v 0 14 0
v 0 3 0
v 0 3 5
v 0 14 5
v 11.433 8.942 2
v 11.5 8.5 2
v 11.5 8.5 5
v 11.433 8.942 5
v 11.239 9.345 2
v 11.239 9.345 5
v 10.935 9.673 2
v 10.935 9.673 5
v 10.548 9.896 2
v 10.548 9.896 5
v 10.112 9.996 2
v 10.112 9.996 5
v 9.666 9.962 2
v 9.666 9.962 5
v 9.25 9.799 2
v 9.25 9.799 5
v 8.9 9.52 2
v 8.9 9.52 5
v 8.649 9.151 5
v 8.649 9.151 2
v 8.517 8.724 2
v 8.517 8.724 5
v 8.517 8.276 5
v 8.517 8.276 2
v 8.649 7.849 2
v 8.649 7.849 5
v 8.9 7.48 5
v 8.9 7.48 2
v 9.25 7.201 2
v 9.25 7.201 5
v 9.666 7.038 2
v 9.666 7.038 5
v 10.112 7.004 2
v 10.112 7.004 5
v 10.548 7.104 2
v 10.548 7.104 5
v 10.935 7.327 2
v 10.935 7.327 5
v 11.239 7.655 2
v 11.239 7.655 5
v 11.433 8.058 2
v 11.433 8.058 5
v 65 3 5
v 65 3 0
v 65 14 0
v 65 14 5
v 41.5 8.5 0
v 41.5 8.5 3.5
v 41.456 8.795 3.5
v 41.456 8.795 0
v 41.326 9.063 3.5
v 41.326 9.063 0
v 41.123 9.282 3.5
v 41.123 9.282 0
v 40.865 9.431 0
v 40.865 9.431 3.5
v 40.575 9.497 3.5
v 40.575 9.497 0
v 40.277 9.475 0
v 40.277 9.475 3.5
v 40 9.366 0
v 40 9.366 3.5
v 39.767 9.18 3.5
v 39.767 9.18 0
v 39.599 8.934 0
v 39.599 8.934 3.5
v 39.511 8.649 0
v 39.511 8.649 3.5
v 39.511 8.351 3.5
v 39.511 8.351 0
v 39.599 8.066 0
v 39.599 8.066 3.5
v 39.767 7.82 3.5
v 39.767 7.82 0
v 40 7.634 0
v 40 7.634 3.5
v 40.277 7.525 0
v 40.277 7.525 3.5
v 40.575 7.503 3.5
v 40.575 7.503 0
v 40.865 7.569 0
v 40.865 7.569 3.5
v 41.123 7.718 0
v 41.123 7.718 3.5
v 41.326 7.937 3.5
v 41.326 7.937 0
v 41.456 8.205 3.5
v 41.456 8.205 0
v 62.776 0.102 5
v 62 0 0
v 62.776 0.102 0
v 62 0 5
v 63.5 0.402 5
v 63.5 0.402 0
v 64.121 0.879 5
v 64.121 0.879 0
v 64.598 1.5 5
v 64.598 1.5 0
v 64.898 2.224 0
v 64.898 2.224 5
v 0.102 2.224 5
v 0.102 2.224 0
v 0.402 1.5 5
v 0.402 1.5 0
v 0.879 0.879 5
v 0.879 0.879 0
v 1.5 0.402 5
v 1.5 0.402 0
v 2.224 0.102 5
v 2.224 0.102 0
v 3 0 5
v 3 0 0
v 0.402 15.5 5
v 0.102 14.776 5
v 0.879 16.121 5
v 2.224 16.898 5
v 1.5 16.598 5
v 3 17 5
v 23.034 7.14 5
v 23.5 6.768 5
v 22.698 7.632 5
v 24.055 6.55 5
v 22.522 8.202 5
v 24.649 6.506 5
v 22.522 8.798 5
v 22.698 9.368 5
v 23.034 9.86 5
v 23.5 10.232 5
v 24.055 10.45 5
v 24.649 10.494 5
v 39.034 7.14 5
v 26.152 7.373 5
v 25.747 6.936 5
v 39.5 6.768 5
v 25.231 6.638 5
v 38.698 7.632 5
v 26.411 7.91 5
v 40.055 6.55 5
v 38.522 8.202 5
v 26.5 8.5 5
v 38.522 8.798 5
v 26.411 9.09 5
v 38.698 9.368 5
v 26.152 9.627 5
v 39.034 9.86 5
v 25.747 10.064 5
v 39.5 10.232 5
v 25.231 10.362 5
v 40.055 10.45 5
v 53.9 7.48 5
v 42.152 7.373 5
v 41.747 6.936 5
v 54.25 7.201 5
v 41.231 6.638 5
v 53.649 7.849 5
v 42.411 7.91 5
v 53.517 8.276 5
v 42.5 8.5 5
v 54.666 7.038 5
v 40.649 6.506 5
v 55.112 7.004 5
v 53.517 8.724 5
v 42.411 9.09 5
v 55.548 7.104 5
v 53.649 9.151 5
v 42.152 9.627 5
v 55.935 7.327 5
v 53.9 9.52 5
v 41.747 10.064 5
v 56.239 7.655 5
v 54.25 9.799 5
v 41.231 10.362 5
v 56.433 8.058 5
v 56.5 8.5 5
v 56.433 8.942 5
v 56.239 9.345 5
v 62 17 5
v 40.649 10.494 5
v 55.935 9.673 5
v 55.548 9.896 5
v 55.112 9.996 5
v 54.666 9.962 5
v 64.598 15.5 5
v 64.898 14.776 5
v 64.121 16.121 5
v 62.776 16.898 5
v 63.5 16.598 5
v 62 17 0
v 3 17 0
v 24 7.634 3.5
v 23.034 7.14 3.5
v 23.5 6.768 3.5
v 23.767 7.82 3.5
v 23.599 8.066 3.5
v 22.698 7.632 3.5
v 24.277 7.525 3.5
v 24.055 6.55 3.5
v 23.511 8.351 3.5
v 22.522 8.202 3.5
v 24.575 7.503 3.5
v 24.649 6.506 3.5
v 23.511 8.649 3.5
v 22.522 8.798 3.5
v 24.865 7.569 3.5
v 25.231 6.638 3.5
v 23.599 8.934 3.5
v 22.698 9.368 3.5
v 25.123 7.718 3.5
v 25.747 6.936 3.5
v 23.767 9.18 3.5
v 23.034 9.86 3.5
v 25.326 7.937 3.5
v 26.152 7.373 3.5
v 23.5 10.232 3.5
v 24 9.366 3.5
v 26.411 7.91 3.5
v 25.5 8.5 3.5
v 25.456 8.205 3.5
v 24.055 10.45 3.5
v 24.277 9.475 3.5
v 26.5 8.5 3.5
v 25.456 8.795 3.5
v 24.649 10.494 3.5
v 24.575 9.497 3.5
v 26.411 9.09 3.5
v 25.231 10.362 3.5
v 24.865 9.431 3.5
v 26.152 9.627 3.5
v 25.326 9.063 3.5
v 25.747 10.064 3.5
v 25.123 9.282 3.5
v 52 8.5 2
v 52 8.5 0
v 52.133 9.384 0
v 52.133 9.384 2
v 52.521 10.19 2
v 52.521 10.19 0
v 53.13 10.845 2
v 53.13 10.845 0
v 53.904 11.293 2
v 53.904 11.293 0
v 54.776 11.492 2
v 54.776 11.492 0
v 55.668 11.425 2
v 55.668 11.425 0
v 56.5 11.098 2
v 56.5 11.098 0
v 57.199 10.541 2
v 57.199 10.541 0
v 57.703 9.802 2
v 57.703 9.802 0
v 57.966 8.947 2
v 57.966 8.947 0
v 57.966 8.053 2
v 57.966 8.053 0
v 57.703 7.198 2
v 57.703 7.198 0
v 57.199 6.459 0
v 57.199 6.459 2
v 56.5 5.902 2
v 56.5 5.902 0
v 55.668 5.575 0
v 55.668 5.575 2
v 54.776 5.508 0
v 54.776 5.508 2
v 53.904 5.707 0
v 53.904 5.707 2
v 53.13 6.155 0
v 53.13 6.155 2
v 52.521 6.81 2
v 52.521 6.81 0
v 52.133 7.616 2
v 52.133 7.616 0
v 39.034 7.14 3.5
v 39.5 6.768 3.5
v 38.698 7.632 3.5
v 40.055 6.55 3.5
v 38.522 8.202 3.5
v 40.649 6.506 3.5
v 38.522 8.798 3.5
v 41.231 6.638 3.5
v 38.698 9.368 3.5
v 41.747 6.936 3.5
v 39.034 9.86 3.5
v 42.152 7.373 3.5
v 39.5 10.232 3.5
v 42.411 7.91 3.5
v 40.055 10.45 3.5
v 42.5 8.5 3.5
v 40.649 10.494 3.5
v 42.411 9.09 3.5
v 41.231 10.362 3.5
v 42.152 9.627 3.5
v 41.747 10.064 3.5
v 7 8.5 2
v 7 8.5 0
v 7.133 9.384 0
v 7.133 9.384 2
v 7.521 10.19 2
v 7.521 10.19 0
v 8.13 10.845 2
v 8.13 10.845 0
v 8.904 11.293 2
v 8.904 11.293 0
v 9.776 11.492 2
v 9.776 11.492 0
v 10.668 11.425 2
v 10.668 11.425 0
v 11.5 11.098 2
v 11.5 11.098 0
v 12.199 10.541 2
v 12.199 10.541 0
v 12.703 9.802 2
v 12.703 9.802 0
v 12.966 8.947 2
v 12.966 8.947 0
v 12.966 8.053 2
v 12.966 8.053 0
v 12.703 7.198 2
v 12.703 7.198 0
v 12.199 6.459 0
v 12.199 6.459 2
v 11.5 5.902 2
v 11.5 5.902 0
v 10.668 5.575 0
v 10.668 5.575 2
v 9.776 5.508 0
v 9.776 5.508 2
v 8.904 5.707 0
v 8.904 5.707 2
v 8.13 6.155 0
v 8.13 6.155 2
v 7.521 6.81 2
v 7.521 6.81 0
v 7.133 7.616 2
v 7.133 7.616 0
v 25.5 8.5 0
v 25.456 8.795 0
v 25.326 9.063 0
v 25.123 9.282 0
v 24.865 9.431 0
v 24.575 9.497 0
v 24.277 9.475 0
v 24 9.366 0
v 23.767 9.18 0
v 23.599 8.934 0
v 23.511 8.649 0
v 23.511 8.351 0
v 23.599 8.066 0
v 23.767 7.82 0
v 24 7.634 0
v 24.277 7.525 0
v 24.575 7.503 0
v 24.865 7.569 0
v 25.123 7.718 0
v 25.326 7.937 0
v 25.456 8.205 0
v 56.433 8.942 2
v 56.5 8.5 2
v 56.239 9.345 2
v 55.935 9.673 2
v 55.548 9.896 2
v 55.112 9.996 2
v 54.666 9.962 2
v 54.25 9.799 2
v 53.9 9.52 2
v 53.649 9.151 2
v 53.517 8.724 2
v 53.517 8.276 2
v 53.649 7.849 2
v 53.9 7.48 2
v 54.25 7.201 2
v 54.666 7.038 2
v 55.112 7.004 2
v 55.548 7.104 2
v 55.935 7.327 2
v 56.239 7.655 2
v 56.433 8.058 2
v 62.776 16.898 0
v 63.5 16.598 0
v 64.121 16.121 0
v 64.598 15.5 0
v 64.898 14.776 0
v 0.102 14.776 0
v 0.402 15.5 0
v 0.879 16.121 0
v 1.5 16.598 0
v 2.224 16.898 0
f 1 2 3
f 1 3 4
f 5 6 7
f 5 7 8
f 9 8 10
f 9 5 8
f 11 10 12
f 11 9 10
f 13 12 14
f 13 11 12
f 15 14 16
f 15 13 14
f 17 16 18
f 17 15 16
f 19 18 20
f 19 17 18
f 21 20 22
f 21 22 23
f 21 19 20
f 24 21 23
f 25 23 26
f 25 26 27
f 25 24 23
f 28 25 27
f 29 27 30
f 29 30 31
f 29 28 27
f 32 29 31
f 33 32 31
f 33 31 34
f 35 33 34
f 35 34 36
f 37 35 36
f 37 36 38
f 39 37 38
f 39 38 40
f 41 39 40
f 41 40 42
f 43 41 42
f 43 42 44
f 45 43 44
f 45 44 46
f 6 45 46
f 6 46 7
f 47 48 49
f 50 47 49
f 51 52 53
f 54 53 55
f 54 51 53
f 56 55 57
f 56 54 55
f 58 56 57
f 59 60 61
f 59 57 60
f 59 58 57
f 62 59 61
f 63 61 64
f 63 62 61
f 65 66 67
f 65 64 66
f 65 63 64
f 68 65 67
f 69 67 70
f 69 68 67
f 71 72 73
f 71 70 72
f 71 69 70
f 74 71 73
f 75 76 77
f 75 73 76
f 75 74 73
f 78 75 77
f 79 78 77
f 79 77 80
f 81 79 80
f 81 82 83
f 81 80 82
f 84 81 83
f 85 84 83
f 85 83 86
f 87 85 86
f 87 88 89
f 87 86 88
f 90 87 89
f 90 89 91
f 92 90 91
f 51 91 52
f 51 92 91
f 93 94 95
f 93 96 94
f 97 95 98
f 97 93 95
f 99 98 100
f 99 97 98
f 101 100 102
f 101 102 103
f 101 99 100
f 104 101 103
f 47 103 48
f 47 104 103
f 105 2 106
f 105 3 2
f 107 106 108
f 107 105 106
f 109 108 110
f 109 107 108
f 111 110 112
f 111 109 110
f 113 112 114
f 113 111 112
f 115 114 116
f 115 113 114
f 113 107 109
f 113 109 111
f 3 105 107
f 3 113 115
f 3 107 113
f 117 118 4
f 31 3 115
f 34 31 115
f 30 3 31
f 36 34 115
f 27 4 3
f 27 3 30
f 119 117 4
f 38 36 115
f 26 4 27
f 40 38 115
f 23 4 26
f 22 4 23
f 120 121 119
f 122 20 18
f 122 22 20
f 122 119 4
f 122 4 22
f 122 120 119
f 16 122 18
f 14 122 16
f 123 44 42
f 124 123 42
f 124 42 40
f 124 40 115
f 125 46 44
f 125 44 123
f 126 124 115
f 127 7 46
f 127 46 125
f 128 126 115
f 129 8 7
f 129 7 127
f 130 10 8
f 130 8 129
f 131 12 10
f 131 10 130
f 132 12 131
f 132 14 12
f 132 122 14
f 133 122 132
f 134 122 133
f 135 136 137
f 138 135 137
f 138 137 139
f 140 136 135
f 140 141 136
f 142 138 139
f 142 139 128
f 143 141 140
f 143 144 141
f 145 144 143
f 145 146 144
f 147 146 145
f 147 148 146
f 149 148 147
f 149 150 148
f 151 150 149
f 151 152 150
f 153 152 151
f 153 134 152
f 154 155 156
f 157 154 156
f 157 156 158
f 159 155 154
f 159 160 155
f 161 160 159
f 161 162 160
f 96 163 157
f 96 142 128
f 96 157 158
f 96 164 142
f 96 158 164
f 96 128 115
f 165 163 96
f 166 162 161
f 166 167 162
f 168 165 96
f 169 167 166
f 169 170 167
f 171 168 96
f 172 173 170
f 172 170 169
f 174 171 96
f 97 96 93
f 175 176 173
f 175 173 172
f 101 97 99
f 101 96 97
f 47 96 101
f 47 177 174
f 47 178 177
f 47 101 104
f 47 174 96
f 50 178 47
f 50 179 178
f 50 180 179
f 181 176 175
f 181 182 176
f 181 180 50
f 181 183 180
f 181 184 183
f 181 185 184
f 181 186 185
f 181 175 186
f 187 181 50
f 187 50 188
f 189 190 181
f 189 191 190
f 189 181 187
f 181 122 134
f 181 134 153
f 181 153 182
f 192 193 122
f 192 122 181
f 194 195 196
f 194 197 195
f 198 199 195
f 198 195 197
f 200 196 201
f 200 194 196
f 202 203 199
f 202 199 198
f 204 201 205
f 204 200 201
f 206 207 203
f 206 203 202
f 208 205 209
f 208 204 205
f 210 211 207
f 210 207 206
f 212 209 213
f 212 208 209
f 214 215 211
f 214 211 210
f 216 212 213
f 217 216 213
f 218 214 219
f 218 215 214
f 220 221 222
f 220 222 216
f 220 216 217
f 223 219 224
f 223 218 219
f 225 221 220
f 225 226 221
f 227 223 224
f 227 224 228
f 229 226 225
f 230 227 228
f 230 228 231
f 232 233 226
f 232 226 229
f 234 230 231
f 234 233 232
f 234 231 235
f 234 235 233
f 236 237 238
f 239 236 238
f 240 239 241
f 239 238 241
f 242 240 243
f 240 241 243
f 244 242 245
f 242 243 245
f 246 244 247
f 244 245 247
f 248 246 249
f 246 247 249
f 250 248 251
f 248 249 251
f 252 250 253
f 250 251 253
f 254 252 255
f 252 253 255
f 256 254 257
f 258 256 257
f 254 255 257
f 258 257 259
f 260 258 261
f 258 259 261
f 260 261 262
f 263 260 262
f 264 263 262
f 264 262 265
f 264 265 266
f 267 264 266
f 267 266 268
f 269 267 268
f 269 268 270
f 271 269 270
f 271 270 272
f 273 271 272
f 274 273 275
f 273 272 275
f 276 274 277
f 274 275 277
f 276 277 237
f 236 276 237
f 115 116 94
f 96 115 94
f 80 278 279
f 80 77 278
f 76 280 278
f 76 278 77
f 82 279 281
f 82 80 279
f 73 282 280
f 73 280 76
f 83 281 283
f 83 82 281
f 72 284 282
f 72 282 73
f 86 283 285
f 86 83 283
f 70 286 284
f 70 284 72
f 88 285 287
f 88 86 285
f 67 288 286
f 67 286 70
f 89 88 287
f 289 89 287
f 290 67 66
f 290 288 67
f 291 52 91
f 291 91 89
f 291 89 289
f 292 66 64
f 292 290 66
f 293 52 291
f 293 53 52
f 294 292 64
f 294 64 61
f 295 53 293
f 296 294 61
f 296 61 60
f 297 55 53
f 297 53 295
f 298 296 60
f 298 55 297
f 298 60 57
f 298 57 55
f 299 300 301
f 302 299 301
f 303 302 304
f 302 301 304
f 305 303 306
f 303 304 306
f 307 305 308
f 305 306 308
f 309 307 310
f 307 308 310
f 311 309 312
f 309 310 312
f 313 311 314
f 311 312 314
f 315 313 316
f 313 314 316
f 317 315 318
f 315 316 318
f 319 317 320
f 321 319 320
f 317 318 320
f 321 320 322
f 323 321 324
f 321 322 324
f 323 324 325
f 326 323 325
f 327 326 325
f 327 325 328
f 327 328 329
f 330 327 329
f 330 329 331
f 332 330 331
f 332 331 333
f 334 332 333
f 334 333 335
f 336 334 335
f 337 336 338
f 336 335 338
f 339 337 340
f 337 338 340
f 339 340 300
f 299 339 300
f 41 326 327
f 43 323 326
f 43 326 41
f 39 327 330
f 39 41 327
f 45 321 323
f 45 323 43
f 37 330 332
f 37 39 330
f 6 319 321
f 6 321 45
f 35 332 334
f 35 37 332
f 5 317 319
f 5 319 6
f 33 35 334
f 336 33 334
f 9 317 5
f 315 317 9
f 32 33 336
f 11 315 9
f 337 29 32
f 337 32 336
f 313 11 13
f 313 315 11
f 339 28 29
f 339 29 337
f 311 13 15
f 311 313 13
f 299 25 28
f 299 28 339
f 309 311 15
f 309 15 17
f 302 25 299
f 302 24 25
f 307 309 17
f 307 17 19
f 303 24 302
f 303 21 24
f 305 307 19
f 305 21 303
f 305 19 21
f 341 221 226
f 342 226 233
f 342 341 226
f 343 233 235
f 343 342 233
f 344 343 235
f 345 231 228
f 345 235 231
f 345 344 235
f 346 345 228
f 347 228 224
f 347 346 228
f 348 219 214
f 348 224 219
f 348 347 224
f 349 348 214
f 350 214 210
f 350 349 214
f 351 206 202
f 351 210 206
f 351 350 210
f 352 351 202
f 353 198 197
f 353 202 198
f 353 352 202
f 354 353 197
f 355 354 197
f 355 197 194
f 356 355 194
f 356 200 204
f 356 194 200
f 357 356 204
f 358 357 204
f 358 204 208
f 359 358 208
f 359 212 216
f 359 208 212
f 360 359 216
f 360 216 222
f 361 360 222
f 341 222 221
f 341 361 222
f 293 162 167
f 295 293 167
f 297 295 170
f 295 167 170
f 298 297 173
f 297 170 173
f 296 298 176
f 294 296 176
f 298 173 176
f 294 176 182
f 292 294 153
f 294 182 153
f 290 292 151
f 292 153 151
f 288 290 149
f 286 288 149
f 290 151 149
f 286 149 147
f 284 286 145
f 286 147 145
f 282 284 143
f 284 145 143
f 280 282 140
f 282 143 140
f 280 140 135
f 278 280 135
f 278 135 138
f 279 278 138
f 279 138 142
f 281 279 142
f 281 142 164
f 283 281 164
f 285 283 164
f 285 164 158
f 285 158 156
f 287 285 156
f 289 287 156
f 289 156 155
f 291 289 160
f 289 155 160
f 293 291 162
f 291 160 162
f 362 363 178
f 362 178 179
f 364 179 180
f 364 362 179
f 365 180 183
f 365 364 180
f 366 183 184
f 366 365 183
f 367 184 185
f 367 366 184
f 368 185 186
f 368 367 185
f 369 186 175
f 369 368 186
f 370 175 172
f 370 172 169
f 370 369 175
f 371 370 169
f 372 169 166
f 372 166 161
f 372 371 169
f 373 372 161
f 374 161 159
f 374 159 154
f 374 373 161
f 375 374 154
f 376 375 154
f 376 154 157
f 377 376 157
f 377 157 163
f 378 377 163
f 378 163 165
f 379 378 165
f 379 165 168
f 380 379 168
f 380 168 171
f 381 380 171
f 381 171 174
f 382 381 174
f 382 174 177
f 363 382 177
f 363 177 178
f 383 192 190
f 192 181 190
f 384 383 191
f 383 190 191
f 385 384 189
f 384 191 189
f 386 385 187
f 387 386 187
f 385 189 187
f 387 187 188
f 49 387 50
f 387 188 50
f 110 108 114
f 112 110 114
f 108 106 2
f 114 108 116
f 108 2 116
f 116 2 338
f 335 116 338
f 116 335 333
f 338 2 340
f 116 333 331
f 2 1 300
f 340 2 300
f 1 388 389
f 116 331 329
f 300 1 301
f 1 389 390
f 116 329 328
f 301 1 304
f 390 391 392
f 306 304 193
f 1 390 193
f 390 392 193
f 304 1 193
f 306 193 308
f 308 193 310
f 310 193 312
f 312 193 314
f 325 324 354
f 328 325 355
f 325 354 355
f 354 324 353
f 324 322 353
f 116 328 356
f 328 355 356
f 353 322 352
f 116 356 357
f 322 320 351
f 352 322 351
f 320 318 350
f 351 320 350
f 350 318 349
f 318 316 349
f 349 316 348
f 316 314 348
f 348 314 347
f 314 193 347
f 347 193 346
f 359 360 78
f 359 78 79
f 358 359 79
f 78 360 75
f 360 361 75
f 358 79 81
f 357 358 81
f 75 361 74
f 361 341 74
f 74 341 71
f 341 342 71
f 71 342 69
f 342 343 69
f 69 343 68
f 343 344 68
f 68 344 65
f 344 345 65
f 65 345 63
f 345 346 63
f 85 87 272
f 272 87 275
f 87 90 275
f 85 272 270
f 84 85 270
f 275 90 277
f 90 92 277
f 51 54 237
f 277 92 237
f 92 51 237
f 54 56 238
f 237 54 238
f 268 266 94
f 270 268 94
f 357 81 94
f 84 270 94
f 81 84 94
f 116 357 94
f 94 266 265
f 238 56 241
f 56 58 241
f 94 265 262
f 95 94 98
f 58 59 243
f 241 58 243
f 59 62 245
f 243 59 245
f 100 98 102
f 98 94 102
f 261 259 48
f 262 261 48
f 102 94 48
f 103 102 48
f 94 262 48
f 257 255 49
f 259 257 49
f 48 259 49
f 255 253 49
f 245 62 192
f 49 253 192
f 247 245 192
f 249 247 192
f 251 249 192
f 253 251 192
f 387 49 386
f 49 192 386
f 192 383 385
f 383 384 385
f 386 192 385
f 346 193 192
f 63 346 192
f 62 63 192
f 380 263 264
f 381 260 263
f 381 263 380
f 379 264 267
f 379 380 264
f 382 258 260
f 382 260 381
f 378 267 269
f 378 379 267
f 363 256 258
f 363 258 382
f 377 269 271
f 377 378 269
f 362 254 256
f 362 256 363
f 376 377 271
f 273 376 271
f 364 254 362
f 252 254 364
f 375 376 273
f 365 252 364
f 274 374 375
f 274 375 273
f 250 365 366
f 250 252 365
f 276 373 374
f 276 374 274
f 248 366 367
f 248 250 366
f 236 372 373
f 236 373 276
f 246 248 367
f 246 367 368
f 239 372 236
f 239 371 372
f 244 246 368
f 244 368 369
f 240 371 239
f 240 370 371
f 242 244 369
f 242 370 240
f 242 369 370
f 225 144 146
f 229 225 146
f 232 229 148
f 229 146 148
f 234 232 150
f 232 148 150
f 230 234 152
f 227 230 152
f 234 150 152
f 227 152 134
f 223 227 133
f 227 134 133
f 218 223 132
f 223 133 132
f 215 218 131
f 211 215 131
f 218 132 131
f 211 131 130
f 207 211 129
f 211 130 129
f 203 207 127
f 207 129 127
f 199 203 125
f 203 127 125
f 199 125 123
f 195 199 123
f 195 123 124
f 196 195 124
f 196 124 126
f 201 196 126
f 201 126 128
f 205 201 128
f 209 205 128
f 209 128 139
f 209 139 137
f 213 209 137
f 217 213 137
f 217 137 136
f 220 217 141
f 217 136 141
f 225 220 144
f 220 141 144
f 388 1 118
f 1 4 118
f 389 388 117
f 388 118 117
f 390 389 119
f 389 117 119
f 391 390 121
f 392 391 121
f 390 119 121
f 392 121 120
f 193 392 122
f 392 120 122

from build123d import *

# Parameters (mm, degrees)
SKETCH1_W           = 65
SKETCH1_H           = 17
SKETCH1_R           = 1.5
SKETCH1_R_2         = 1
BOSS_EXTRUDE1_DEPTH = 5
FILLET1_R           = 3
SKETCH3_R           = 2
CUT_EXTRUDE2_DEPTH  = 1.5
SKETCH4_R           = 3
CUT_EXTRUDE3_DEPTH  = 2


with BuildPart() as part:
    # Sketch1 → Boss-Extrude1 (new body)
    with BuildSketch(Plane.XY):
        with Locations((32.5, 8.5)):
            Rectangle(SKETCH1_W, SKETCH1_H)
        with Locations((55, 8.5)):
            Circle(SKETCH1_R, mode=Mode.SUBTRACT)
        with Locations((10, 8.5)):
            Circle(SKETCH1_R, mode=Mode.SUBTRACT)
        with Locations((24.5, 8.5)):
            Circle(SKETCH1_R_2, mode=Mode.SUBTRACT)
        with Locations((40.5, 8.5)):
            Circle(SKETCH1_R_2, mode=Mode.SUBTRACT)
    extrude(amount=BOSS_EXTRUDE1_DEPTH)

    # Fillet1
    fillet1_edges = [part.edges().sort_by_distance(p)[0] for p in [
        (0, 17, 2.5),
        (65, 17, 2.5),
        (65, 0, 2.5),
        (0, 0, 2.5),
    ]]
    fillet(fillet1_edges, radius=FILLET1_R)

    # Sketch3 → Cut-Extrude2 (cut)
    with BuildSketch(Plane.XY.offset(5)):
        with Locations((24.5, 8.5)):
            Circle(SKETCH3_R)
        with Locations((40.5, 8.5)):
            Circle(SKETCH3_R)
    extrude(amount=-CUT_EXTRUDE2_DEPTH, mode=Mode.SUBTRACT)

    # Sketch4 → Cut-Extrude3 (cut)
    with BuildSketch(Plane(origin=(0, 0, 0), x_dir=(-1, 0, 0), z_dir=(0, 0, -1))):
        with Locations((-55, 8.5)):
            Circle(SKETCH4_R)
        with Locations((-10, 8.5)):
            Circle(SKETCH4_R)
    extrude(amount=-CUT_EXTRUDE3_DEPTH, mode=Mode.SUBTRACT)


solid = part.part
